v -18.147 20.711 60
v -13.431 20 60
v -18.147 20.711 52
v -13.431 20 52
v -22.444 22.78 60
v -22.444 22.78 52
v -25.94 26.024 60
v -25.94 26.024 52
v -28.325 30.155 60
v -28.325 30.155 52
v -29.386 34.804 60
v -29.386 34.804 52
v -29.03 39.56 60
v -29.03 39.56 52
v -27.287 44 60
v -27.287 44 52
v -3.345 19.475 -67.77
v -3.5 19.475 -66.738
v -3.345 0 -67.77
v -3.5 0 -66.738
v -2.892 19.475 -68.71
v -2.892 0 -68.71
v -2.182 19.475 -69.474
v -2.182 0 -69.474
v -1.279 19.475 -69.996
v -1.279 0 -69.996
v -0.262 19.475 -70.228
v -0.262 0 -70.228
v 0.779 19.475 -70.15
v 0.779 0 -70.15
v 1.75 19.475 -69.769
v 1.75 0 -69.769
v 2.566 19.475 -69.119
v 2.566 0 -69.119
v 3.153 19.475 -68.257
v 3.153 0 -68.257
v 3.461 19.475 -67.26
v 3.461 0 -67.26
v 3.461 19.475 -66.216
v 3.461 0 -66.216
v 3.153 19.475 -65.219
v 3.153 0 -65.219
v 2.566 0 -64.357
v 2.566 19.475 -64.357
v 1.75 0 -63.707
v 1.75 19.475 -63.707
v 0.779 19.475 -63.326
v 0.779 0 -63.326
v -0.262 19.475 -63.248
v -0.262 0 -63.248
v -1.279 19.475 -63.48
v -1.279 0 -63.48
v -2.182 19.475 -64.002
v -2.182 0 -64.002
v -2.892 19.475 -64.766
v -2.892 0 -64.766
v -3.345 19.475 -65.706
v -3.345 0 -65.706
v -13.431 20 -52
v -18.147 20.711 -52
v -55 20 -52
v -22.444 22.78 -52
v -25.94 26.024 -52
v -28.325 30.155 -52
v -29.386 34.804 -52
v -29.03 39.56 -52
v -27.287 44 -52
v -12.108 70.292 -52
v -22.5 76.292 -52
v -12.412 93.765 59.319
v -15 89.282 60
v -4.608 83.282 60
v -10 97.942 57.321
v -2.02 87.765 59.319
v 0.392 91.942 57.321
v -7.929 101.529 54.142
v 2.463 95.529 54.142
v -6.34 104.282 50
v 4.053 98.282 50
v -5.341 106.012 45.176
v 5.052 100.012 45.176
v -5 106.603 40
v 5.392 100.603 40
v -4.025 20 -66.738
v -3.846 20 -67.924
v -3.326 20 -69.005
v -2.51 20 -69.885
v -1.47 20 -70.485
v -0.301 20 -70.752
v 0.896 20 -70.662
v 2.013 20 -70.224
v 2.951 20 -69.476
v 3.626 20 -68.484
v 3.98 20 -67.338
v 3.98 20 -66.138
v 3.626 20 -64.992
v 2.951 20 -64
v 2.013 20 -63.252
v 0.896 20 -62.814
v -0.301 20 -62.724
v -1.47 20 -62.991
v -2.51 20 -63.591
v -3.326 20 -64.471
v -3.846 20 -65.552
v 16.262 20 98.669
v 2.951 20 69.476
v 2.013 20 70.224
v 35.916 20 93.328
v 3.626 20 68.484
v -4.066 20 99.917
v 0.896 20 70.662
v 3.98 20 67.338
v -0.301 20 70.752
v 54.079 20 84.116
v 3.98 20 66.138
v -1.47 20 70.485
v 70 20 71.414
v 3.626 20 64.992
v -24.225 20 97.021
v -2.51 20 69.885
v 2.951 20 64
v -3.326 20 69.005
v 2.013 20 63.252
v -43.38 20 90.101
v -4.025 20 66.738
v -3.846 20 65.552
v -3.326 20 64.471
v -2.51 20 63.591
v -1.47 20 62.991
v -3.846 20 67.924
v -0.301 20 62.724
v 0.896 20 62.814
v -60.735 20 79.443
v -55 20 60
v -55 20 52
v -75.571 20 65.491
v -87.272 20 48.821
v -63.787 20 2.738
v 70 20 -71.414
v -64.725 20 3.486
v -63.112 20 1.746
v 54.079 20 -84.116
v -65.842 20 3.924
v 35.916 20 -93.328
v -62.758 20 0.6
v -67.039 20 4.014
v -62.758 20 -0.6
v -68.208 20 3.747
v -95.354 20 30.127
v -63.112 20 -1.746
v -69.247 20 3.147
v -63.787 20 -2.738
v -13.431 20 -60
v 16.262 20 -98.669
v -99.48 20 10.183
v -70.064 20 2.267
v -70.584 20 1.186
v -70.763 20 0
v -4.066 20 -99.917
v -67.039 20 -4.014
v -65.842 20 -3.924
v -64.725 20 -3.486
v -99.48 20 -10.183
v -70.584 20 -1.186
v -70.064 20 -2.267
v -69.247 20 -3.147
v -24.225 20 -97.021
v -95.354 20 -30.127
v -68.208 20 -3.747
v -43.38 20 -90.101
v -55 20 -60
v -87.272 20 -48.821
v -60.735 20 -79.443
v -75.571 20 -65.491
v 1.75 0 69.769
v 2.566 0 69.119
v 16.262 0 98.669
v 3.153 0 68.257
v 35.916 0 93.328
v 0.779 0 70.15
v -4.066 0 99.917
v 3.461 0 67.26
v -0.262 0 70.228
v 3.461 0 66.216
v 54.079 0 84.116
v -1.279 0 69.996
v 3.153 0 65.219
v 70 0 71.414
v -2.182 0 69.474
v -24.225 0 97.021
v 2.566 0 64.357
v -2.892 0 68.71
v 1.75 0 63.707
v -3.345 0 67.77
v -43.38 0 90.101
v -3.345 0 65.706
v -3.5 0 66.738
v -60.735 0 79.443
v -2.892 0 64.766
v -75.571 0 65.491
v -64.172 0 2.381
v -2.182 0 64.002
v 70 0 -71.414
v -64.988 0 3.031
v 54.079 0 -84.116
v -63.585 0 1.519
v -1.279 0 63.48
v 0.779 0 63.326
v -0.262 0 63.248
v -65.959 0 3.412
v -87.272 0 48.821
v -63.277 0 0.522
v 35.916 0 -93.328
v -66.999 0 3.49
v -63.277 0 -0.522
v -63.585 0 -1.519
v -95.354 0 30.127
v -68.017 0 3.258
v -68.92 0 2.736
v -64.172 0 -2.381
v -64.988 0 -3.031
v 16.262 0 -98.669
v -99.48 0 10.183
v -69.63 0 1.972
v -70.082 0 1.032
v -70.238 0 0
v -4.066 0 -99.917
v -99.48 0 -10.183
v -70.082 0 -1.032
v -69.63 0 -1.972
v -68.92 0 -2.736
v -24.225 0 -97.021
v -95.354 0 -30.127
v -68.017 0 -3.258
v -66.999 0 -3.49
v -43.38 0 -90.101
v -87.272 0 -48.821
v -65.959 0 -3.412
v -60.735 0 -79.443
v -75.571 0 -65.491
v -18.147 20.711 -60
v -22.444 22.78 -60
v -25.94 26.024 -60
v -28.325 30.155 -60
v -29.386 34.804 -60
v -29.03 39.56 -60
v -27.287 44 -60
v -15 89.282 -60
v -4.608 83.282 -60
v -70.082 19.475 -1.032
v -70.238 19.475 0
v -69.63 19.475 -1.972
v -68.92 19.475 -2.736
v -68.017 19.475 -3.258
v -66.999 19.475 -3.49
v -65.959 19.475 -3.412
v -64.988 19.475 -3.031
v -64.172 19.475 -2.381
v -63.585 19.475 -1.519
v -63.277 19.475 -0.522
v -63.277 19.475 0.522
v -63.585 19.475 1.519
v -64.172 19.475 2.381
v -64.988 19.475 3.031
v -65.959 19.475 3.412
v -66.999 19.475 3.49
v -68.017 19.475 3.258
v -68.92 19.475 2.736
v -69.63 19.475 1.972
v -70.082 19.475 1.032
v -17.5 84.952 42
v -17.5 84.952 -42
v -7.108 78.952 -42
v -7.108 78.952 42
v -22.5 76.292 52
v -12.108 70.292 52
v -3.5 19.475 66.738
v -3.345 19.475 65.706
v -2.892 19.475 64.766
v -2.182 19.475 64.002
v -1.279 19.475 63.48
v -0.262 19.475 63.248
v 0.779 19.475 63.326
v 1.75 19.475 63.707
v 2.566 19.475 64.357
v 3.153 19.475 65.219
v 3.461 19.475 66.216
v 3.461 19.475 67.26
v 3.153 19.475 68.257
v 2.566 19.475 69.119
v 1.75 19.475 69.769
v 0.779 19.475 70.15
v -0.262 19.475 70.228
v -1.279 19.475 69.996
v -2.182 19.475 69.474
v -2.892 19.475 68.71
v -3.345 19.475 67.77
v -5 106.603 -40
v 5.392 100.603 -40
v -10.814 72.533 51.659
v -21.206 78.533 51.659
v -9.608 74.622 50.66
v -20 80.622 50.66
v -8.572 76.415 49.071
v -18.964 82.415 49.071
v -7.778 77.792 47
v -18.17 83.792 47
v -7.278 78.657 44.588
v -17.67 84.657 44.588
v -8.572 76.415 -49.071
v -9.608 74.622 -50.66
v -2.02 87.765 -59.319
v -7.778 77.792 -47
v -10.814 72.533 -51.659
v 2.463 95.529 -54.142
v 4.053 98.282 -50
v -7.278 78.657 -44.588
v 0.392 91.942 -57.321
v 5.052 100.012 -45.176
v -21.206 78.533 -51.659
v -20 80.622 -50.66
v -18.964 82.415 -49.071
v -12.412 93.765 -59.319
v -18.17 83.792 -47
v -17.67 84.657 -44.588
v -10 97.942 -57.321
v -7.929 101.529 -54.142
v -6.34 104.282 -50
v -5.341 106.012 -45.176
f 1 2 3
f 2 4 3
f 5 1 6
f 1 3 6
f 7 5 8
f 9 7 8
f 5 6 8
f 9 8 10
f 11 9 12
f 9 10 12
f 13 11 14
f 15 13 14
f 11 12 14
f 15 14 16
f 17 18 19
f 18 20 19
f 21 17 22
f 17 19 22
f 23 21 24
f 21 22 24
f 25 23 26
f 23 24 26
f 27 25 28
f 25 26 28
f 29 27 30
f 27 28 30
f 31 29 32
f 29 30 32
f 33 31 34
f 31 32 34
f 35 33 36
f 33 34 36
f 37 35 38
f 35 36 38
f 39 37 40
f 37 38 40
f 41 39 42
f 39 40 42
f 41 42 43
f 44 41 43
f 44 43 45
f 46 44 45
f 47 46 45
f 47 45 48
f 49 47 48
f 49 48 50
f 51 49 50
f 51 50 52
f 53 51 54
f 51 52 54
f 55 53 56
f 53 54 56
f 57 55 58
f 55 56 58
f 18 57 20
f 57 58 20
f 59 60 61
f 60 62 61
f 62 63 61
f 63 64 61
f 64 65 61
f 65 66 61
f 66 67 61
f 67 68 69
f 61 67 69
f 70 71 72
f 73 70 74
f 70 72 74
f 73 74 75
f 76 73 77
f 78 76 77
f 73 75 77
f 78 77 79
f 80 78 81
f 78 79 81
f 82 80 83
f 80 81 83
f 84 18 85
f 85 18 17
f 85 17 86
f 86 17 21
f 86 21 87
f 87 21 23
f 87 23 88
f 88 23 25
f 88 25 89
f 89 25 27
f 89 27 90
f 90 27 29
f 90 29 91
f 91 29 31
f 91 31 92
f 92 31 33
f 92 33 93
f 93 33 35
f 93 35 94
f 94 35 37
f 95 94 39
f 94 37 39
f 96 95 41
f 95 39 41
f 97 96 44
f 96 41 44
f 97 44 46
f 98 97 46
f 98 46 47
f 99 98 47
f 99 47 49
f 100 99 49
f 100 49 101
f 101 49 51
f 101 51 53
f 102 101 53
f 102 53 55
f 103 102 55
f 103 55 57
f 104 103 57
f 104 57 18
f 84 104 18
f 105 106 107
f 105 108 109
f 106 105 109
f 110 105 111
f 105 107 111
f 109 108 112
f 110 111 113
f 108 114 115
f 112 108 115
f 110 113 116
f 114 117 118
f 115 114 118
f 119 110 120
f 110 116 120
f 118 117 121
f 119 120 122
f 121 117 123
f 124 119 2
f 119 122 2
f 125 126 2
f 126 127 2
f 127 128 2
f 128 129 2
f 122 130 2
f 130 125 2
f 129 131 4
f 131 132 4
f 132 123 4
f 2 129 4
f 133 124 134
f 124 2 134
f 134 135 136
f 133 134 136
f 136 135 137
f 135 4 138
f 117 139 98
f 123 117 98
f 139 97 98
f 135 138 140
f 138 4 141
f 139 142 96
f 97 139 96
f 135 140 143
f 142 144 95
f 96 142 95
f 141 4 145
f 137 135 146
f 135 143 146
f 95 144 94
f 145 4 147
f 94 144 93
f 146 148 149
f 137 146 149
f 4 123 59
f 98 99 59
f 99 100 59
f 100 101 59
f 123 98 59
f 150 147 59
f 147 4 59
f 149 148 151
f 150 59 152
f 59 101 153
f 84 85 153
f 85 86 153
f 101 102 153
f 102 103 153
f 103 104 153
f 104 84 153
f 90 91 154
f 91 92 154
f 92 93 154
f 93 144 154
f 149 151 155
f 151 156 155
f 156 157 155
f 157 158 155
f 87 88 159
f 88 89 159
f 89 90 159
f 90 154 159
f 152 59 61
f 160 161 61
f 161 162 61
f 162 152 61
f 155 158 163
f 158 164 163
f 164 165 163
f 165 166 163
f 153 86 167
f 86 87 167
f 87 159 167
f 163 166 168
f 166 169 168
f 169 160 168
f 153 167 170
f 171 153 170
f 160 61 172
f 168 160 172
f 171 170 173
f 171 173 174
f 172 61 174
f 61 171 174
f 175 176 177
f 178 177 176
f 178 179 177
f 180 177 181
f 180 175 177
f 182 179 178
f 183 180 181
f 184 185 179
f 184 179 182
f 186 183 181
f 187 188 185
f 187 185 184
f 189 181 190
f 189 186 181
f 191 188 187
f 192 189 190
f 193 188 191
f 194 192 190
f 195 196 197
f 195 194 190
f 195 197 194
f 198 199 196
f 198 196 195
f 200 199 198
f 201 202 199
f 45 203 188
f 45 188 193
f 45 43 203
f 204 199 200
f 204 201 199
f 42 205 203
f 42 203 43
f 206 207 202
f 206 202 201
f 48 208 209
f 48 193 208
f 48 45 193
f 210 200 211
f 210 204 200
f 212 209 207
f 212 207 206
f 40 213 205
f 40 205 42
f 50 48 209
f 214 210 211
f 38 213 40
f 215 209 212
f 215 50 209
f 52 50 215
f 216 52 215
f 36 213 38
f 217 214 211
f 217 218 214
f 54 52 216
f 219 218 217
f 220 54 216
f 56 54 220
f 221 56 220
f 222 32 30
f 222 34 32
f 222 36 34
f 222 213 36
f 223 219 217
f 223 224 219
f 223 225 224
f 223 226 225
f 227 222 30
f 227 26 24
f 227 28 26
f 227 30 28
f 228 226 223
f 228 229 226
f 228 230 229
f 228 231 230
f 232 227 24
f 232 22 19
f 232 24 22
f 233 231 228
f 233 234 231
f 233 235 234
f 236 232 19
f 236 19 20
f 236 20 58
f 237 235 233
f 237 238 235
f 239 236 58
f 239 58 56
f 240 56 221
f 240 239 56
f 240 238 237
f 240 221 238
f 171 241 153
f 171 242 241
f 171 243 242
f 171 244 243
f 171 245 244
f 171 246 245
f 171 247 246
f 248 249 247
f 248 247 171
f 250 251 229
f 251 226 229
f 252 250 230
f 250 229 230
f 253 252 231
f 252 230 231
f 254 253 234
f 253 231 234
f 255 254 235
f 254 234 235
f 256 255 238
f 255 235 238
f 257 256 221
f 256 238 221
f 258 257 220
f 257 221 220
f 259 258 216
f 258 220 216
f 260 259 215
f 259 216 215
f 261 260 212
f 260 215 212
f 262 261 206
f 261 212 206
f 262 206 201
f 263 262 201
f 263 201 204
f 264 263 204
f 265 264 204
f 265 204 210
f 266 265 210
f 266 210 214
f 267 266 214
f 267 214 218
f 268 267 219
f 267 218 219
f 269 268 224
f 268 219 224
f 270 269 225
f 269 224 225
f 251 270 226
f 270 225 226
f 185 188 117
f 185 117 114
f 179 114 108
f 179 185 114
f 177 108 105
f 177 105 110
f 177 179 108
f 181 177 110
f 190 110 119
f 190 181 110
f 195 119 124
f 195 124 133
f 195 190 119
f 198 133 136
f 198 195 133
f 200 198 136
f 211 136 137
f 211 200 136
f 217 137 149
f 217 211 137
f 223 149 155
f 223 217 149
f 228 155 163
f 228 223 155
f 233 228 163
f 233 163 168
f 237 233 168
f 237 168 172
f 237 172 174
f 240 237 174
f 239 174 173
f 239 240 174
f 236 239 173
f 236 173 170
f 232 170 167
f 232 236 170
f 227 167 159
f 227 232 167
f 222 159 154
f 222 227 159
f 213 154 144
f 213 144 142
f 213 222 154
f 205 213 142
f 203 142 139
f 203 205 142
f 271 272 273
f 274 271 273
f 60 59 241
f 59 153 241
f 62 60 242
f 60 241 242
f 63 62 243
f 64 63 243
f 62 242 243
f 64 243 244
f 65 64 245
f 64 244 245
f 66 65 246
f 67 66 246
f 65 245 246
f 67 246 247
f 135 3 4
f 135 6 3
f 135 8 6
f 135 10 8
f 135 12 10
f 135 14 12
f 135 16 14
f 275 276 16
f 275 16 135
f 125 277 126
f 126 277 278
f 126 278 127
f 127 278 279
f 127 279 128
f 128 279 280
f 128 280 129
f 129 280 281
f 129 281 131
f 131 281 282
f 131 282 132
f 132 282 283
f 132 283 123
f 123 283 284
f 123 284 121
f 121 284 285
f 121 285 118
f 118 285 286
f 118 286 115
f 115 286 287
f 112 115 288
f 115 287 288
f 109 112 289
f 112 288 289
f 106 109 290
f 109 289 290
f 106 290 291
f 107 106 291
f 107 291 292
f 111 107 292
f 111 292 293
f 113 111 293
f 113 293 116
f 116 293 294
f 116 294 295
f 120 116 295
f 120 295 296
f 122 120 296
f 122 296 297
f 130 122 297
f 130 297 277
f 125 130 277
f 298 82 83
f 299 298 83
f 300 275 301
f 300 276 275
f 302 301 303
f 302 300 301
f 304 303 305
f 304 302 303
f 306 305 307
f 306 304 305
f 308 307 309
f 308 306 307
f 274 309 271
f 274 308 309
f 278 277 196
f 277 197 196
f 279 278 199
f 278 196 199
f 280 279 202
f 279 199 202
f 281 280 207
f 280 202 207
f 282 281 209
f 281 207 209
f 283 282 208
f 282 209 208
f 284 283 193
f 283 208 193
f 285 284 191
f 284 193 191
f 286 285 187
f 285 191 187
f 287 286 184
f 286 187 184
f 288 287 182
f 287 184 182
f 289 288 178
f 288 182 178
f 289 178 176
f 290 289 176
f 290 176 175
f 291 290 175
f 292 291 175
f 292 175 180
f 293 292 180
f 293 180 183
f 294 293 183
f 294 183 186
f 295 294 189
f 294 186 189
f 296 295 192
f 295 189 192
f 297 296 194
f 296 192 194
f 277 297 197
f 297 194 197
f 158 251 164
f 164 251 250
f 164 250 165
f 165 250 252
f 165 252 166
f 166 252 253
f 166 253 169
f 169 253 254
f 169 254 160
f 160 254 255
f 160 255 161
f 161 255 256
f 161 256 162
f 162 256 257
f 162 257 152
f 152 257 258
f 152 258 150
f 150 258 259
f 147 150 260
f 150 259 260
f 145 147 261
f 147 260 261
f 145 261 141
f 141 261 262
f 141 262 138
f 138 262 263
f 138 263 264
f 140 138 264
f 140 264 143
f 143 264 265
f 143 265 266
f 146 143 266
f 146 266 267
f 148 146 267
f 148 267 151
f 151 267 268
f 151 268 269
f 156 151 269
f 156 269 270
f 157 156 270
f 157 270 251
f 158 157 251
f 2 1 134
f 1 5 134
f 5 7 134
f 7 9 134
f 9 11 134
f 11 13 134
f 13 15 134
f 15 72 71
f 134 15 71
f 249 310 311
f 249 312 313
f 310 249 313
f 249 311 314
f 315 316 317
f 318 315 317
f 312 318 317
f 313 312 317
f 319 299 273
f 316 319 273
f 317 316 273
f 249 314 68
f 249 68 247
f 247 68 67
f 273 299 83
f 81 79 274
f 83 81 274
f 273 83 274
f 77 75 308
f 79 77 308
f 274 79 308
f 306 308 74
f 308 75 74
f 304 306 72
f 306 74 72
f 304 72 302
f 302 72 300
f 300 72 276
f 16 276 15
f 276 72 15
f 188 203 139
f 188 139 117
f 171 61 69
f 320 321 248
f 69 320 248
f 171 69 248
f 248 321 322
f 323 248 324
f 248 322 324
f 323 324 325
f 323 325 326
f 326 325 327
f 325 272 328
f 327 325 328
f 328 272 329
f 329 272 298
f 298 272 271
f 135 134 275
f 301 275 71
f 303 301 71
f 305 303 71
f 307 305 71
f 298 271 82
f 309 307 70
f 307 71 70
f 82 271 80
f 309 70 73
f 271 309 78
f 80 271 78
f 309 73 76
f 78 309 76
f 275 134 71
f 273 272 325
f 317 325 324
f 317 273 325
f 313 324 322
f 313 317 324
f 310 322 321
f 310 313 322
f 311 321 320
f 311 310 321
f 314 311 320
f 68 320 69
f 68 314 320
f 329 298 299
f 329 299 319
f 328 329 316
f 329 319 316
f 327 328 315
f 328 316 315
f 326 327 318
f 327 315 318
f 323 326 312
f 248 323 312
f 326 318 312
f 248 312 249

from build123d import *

# Parameters (mm, degrees)
EXTRUDE_2_DEPTH      = 20
EXTRUDE_2_2_DEPTH    = 60
CUT_EXTRUDE_2_DEPTH  = 52
FILLET_1_R           = 20
FILLET_2_R           = 10
FILLET_4_R           = 16
FILLET_5_R           = 16
M8X1_0_1_D           = 7
M8X1_0_1_CSINK_D     = 8.05
M8X1_0_1_CSINK_ANGLE = 90


with BuildPart() as part:
    # 草图1 → Extrude 2 (new body)
    with BuildSketch(Plane(origin=(0, 0, 0), x_dir=(1, 0, 0), z_dir=(0, 1, 0))):
        with BuildLine():
            Line((70, 71.414284285), (70, -71.414284285))
            ThreePointArc((70, -71.414284285), (-100, 0), (70, 71.414284285))
        make_face()
    extrude(amount=EXTRUDE_2_DEPTH)

    # 草图5 → Extrude 2 2 (add, symmetric)
    with BuildSketch(Plane.XY):
        Polygon((-55, 20), (-5, 106.602540378), (5.392304845, 100.602540378), (-44.607695155, 14), align=None)
    extrude(amount=EXTRUDE_2_2_DEPTH, both=True)

    # 草图7 → 切除-拉伸2 (cut, symmetric)
    with BuildSketch(Plane.XY):
        Polygon((-17.5, 84.951905284), (-7.107695155, 78.951905284), (-41.143593539, 20), (-55, 20), align=None)
    extrude(amount=CUT_EXTRUDE_2_DEPTH, both=True, mode=Mode.SUBTRACT)

    # 圆角1
    fillet_1_edges = [part.edges().sort_by_distance(p)[0] for p in [
        (0.196152423, 103.602540378, 60),
        (0.196152423, 103.602540378, -60),
    ]]
    fillet(fillet_1_edges, radius=FILLET_1_R)

    # 圆角2
    fillet_2_edges = [part.edges().sort_by_distance(p)[0] for p in [
        (-12.303847577, 81.951905284, -52),
        (-12.303847577, 81.951905284, 52),
    ]]
    fillet(fillet_2_edges, radius=FILLET_2_R)

    # 圆角4
    fillet_4_edges = [part.edges().sort_by_distance(p)[0] for p in [
        (-41.143593539, 20, -56),
    ]]
    fillet(fillet_4_edges, radius=FILLET_4_R)

    # 圆角5
    fillet_5_edges = [part.edges().sort_by_distance(p)[0] for p in [
        (-41.143593539, 20, 56),
    ]]
    fillet(fillet_5_edges, radius=FILLET_5_R)

    # M8x1.0 螺纹孔1 (through all)
    with Locations(Plane(origin=(0, 20, 0), x_dir=(1, 0, 0), z_dir=(0, 1, 0))):
        with Locations((-66.737936963, 0), (0, 66.737936963), (0, -66.737936963)):
            CounterSinkHole(M8X1_0_1_D / 2, M8X1_0_1_CSINK_D / 2, counter_sink_angle=M8X1_0_1_CSINK_ANGLE)


solid = part.part
